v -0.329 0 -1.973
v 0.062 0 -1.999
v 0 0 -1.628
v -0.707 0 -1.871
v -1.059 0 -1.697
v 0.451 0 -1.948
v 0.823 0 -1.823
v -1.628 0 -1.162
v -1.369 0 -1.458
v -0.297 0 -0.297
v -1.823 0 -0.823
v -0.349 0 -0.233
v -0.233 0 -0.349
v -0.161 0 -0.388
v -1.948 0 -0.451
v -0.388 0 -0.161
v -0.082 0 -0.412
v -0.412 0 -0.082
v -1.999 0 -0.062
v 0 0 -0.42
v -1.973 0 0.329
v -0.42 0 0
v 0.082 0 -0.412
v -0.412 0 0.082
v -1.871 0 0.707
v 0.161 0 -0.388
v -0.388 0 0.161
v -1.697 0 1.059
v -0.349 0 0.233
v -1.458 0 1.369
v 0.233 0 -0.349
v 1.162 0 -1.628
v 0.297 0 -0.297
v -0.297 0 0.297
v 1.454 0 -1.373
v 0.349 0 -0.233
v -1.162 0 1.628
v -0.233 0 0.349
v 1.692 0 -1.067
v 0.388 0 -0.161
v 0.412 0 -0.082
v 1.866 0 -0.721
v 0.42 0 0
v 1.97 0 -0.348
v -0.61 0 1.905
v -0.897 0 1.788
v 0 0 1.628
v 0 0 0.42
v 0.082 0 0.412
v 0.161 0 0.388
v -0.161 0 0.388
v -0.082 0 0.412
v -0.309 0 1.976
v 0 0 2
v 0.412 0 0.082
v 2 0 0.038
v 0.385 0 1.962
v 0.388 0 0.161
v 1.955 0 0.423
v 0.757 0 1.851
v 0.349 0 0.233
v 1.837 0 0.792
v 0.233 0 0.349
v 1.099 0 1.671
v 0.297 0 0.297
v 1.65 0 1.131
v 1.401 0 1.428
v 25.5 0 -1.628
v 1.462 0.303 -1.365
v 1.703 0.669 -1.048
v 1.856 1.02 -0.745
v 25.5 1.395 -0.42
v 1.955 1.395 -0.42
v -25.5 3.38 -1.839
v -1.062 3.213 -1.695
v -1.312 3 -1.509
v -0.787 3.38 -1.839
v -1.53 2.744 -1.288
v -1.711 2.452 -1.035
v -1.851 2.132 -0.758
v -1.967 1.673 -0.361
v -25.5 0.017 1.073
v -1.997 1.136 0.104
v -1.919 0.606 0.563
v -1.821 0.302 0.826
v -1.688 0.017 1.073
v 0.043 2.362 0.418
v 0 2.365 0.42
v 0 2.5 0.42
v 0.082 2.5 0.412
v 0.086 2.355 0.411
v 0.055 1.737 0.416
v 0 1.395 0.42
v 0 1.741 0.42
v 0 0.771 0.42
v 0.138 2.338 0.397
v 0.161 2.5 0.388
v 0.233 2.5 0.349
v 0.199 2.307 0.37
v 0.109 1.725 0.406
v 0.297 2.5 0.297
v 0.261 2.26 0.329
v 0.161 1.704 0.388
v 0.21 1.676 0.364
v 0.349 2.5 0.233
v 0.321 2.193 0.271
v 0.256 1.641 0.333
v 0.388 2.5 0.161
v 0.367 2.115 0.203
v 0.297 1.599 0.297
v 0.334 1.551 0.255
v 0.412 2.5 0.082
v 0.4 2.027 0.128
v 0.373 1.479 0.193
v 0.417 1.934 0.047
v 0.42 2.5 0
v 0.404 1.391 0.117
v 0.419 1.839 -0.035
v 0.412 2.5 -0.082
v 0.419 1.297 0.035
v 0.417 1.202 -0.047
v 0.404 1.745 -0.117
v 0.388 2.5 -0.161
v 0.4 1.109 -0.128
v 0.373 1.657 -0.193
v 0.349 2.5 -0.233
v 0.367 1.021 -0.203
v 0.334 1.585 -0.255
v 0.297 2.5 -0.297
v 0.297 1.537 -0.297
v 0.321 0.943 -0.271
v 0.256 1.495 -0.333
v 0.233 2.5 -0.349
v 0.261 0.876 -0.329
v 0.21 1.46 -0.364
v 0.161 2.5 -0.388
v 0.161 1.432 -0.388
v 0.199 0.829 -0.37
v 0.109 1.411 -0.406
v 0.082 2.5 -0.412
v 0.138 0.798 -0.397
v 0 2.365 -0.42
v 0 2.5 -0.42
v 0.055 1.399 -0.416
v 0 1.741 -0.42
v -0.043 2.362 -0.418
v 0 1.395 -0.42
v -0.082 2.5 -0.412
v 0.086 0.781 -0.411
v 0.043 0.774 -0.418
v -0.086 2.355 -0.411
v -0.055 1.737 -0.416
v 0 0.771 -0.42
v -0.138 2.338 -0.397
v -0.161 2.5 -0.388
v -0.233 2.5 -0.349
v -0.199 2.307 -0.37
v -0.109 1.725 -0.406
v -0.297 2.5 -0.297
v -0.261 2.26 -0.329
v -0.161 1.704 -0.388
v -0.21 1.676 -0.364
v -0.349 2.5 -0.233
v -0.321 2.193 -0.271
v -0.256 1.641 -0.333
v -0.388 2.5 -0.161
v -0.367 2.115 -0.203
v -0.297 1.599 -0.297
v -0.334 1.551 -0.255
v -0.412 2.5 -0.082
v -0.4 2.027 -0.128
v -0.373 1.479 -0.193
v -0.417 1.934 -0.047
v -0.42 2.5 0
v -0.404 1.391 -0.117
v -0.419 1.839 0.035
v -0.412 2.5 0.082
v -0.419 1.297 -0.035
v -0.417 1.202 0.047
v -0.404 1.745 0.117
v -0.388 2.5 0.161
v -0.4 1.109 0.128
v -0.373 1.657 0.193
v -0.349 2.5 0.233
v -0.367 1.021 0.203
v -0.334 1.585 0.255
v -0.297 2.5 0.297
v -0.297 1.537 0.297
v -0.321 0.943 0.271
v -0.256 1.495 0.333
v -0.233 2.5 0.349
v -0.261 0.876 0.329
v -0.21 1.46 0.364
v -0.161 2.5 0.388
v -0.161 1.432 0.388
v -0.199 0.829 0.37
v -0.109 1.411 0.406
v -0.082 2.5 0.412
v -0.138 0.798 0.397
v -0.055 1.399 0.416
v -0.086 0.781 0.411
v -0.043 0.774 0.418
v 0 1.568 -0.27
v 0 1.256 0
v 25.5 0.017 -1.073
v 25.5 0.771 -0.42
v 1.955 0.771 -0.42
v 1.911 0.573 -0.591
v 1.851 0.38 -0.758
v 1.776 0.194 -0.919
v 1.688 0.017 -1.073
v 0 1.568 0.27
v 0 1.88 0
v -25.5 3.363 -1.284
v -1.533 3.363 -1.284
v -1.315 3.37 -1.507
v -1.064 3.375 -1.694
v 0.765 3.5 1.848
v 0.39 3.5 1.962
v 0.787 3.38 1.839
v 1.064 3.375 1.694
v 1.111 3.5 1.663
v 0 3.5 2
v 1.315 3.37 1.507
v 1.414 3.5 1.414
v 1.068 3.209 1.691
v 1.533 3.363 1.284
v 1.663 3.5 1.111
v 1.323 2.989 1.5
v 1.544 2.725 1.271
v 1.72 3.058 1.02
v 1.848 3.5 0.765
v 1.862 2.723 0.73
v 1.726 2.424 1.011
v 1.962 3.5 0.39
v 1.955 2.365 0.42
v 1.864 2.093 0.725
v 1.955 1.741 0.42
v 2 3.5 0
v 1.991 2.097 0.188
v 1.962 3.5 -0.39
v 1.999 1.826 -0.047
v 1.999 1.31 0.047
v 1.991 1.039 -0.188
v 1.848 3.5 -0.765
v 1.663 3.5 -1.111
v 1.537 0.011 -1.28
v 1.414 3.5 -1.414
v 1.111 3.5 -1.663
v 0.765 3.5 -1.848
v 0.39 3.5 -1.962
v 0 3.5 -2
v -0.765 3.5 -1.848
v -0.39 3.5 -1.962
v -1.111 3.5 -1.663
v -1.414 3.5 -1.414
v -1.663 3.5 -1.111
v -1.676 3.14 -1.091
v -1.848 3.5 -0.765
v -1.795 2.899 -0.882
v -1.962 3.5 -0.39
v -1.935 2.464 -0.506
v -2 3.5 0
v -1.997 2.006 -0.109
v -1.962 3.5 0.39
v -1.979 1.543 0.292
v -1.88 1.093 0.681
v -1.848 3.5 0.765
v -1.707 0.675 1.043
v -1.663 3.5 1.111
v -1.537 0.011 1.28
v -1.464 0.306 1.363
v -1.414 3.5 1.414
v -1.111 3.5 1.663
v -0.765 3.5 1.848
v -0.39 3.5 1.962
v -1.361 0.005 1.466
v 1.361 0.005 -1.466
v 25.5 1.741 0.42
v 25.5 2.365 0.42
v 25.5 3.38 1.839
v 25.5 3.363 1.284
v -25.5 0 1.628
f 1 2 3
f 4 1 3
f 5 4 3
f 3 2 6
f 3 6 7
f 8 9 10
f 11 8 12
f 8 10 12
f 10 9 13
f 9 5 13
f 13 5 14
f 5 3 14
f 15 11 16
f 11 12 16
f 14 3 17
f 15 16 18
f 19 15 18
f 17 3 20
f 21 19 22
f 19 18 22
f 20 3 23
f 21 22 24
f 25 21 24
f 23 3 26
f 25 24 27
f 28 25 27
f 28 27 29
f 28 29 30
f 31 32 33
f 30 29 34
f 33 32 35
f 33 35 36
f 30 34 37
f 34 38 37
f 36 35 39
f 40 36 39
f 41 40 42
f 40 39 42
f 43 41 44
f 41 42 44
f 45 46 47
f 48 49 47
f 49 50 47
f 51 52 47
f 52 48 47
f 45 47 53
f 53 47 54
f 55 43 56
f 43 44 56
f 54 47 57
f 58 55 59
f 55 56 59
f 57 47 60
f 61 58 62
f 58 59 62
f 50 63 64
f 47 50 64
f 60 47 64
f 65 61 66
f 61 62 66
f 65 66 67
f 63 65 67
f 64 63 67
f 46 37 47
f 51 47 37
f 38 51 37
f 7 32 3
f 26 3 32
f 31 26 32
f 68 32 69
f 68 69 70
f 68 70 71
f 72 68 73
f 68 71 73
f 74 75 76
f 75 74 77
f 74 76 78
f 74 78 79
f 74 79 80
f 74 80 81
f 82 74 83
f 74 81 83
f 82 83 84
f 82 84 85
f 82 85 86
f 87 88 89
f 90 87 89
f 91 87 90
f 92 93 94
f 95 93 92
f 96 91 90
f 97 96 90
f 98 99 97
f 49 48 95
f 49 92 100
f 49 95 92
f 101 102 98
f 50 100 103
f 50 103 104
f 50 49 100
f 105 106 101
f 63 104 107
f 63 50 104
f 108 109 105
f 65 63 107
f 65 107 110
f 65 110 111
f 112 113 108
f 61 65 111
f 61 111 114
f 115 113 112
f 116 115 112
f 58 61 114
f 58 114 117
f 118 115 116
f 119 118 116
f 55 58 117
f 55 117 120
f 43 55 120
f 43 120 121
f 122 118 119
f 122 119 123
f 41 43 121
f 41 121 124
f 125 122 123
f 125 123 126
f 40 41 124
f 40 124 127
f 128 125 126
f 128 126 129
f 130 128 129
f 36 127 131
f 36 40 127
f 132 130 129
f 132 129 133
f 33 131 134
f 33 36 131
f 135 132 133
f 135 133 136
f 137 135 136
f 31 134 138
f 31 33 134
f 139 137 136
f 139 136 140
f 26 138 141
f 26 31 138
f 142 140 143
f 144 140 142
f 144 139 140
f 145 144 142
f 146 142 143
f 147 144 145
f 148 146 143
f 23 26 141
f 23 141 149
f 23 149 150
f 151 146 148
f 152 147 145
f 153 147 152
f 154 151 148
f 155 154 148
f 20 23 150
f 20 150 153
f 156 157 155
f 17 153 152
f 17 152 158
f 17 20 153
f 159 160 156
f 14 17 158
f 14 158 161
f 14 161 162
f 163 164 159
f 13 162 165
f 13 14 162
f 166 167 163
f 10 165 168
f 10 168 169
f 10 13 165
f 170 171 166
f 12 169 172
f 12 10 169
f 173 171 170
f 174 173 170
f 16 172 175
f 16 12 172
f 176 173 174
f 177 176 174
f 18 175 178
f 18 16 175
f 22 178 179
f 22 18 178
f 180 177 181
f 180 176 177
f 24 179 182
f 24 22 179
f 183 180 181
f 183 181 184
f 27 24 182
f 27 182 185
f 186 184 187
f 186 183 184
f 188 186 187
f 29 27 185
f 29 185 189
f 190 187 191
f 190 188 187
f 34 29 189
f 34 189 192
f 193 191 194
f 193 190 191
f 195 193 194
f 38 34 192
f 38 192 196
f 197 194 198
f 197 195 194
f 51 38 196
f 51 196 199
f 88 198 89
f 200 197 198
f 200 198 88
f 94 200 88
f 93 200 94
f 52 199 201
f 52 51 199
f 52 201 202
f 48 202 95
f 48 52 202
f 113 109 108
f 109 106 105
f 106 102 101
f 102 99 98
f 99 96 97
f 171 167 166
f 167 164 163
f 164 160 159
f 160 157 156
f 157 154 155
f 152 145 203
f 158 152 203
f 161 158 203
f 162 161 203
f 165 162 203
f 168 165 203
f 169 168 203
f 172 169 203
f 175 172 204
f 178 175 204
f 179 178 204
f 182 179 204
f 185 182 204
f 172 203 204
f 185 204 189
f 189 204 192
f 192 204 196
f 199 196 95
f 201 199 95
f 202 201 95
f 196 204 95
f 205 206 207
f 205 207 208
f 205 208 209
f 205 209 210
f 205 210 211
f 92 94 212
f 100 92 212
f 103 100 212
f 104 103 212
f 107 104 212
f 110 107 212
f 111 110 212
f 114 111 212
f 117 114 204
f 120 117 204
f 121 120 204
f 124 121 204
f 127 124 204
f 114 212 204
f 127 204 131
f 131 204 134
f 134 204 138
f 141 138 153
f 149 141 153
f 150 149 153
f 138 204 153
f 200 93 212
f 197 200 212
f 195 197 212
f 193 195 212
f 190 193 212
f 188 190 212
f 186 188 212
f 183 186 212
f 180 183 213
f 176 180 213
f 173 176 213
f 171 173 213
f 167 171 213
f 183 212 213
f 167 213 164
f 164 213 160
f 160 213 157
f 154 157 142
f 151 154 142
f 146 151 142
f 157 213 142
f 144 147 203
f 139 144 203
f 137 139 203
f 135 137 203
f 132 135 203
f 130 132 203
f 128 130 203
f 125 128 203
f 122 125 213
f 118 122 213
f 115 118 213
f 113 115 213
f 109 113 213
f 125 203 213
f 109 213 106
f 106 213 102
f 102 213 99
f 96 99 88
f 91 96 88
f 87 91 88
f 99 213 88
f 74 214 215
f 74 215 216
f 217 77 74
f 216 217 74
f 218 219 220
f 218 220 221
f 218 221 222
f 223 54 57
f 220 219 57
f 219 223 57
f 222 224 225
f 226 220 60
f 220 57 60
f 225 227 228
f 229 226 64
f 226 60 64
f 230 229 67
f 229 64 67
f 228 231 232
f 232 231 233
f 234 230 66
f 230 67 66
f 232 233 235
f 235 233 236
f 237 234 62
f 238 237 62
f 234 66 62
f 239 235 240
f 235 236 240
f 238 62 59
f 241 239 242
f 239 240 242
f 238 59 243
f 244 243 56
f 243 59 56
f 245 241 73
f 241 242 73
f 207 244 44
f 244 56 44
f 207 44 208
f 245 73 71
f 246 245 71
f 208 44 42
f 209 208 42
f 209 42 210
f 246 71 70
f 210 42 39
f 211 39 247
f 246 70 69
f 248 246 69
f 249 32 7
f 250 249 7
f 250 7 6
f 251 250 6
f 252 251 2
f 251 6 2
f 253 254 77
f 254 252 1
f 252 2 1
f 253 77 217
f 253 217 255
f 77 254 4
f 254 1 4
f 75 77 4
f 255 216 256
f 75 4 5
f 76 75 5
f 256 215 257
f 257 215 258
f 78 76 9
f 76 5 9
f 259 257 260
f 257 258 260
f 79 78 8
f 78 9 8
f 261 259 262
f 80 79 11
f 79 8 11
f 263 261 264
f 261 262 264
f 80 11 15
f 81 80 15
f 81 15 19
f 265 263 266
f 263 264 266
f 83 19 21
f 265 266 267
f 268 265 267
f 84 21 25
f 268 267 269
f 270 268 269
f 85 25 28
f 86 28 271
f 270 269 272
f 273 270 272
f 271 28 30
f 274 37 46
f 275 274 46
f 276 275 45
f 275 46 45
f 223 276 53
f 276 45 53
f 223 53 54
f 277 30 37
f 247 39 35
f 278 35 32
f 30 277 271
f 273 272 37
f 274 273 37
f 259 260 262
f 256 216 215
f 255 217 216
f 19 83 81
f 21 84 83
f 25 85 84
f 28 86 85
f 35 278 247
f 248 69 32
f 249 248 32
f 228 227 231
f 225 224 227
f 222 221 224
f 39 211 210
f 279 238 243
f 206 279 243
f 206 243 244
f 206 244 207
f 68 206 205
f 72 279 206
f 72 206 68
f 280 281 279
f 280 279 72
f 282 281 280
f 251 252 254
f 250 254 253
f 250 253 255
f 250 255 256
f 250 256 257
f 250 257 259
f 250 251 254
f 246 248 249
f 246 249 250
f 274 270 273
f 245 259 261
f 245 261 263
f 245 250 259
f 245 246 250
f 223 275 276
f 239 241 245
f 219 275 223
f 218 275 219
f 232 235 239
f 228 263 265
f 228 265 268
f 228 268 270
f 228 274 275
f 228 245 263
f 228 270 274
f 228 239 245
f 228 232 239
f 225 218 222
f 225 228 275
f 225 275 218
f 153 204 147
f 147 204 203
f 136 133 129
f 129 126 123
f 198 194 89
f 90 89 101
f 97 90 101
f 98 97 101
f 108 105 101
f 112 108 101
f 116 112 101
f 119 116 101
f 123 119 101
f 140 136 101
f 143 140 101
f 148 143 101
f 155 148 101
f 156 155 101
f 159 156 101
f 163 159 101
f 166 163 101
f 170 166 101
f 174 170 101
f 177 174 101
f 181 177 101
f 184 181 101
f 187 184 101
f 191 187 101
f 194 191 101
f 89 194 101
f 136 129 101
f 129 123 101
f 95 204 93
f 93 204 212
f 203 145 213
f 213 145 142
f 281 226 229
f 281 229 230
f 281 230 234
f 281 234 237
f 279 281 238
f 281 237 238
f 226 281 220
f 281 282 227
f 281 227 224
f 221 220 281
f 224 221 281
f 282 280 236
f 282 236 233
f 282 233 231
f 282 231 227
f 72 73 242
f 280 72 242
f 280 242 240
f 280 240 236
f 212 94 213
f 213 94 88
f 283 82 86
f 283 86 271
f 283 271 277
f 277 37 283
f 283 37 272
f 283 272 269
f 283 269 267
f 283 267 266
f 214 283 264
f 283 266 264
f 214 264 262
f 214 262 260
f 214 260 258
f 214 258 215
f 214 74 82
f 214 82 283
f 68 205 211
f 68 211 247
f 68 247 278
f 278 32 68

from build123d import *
from build123d.topology import SkipClean

# Parameters (mm, degrees)
SKETCH1_R           = 2
BOSS_EXTRUDE1_DEPTH = 3.5
SKETCH2_R           = 0.42
CUT_EXTRUDE1_DEPTH  = 2.5
BOSS_EXTRUDE2_DEPTH = 25.5
BOSS_EXTRUDE3_DEPTH = 25.5


with BuildPart() as part:
    # Sketch1 → Boss-Extrude1 (new body)
    with BuildSketch(Plane(origin=(0, 0, 0), x_dir=(1, 0, 0), z_dir=(0, 1, 0))):
        Circle(SKETCH1_R)
    extrude(amount=BOSS_EXTRUDE1_DEPTH)

    # Sketch2 → Cut-Extrude1 (cut)
    with BuildSketch(Plane(origin=(0, 0, 0), x_dir=(1, 0, 0), z_dir=(0, 1, 0))):
        Circle(SKETCH2_R)
    extrude(amount=CUT_EXTRUDE1_DEPTH, mode=Mode.SUBTRACT)

    # Sketch3 → Boss-Extrude2 (add)
    with SkipClean():  # the faces are left unmerged after this step: merging them gives an invalid solid
        with BuildSketch(Plane(origin=(0, 0, 0), x_dir=(0, 0, -1), z_dir=(1, 0, 0))):
            Polygon((1.627531183, 0), (-1.283933552, 3.362939097), (-1.838612291, 3.379776249), (1.072852444, 0.016837151), align=None)
        extrude(amount=BOSS_EXTRUDE2_DEPTH)

    # Sketch4 → Boss-Extrude3 (add)
    with SkipClean():  # the faces are left unmerged after this step: merging them gives an invalid solid
        with BuildSketch(Plane.ZY):
            Polygon((1.627531183, 0), (-1.283933552, 3.362939097), (-1.838612291, 3.379776249), (1.072852444, 0.016837151), align=None)
        extrude(amount=BOSS_EXTRUDE3_DEPTH)


solid = part.part
